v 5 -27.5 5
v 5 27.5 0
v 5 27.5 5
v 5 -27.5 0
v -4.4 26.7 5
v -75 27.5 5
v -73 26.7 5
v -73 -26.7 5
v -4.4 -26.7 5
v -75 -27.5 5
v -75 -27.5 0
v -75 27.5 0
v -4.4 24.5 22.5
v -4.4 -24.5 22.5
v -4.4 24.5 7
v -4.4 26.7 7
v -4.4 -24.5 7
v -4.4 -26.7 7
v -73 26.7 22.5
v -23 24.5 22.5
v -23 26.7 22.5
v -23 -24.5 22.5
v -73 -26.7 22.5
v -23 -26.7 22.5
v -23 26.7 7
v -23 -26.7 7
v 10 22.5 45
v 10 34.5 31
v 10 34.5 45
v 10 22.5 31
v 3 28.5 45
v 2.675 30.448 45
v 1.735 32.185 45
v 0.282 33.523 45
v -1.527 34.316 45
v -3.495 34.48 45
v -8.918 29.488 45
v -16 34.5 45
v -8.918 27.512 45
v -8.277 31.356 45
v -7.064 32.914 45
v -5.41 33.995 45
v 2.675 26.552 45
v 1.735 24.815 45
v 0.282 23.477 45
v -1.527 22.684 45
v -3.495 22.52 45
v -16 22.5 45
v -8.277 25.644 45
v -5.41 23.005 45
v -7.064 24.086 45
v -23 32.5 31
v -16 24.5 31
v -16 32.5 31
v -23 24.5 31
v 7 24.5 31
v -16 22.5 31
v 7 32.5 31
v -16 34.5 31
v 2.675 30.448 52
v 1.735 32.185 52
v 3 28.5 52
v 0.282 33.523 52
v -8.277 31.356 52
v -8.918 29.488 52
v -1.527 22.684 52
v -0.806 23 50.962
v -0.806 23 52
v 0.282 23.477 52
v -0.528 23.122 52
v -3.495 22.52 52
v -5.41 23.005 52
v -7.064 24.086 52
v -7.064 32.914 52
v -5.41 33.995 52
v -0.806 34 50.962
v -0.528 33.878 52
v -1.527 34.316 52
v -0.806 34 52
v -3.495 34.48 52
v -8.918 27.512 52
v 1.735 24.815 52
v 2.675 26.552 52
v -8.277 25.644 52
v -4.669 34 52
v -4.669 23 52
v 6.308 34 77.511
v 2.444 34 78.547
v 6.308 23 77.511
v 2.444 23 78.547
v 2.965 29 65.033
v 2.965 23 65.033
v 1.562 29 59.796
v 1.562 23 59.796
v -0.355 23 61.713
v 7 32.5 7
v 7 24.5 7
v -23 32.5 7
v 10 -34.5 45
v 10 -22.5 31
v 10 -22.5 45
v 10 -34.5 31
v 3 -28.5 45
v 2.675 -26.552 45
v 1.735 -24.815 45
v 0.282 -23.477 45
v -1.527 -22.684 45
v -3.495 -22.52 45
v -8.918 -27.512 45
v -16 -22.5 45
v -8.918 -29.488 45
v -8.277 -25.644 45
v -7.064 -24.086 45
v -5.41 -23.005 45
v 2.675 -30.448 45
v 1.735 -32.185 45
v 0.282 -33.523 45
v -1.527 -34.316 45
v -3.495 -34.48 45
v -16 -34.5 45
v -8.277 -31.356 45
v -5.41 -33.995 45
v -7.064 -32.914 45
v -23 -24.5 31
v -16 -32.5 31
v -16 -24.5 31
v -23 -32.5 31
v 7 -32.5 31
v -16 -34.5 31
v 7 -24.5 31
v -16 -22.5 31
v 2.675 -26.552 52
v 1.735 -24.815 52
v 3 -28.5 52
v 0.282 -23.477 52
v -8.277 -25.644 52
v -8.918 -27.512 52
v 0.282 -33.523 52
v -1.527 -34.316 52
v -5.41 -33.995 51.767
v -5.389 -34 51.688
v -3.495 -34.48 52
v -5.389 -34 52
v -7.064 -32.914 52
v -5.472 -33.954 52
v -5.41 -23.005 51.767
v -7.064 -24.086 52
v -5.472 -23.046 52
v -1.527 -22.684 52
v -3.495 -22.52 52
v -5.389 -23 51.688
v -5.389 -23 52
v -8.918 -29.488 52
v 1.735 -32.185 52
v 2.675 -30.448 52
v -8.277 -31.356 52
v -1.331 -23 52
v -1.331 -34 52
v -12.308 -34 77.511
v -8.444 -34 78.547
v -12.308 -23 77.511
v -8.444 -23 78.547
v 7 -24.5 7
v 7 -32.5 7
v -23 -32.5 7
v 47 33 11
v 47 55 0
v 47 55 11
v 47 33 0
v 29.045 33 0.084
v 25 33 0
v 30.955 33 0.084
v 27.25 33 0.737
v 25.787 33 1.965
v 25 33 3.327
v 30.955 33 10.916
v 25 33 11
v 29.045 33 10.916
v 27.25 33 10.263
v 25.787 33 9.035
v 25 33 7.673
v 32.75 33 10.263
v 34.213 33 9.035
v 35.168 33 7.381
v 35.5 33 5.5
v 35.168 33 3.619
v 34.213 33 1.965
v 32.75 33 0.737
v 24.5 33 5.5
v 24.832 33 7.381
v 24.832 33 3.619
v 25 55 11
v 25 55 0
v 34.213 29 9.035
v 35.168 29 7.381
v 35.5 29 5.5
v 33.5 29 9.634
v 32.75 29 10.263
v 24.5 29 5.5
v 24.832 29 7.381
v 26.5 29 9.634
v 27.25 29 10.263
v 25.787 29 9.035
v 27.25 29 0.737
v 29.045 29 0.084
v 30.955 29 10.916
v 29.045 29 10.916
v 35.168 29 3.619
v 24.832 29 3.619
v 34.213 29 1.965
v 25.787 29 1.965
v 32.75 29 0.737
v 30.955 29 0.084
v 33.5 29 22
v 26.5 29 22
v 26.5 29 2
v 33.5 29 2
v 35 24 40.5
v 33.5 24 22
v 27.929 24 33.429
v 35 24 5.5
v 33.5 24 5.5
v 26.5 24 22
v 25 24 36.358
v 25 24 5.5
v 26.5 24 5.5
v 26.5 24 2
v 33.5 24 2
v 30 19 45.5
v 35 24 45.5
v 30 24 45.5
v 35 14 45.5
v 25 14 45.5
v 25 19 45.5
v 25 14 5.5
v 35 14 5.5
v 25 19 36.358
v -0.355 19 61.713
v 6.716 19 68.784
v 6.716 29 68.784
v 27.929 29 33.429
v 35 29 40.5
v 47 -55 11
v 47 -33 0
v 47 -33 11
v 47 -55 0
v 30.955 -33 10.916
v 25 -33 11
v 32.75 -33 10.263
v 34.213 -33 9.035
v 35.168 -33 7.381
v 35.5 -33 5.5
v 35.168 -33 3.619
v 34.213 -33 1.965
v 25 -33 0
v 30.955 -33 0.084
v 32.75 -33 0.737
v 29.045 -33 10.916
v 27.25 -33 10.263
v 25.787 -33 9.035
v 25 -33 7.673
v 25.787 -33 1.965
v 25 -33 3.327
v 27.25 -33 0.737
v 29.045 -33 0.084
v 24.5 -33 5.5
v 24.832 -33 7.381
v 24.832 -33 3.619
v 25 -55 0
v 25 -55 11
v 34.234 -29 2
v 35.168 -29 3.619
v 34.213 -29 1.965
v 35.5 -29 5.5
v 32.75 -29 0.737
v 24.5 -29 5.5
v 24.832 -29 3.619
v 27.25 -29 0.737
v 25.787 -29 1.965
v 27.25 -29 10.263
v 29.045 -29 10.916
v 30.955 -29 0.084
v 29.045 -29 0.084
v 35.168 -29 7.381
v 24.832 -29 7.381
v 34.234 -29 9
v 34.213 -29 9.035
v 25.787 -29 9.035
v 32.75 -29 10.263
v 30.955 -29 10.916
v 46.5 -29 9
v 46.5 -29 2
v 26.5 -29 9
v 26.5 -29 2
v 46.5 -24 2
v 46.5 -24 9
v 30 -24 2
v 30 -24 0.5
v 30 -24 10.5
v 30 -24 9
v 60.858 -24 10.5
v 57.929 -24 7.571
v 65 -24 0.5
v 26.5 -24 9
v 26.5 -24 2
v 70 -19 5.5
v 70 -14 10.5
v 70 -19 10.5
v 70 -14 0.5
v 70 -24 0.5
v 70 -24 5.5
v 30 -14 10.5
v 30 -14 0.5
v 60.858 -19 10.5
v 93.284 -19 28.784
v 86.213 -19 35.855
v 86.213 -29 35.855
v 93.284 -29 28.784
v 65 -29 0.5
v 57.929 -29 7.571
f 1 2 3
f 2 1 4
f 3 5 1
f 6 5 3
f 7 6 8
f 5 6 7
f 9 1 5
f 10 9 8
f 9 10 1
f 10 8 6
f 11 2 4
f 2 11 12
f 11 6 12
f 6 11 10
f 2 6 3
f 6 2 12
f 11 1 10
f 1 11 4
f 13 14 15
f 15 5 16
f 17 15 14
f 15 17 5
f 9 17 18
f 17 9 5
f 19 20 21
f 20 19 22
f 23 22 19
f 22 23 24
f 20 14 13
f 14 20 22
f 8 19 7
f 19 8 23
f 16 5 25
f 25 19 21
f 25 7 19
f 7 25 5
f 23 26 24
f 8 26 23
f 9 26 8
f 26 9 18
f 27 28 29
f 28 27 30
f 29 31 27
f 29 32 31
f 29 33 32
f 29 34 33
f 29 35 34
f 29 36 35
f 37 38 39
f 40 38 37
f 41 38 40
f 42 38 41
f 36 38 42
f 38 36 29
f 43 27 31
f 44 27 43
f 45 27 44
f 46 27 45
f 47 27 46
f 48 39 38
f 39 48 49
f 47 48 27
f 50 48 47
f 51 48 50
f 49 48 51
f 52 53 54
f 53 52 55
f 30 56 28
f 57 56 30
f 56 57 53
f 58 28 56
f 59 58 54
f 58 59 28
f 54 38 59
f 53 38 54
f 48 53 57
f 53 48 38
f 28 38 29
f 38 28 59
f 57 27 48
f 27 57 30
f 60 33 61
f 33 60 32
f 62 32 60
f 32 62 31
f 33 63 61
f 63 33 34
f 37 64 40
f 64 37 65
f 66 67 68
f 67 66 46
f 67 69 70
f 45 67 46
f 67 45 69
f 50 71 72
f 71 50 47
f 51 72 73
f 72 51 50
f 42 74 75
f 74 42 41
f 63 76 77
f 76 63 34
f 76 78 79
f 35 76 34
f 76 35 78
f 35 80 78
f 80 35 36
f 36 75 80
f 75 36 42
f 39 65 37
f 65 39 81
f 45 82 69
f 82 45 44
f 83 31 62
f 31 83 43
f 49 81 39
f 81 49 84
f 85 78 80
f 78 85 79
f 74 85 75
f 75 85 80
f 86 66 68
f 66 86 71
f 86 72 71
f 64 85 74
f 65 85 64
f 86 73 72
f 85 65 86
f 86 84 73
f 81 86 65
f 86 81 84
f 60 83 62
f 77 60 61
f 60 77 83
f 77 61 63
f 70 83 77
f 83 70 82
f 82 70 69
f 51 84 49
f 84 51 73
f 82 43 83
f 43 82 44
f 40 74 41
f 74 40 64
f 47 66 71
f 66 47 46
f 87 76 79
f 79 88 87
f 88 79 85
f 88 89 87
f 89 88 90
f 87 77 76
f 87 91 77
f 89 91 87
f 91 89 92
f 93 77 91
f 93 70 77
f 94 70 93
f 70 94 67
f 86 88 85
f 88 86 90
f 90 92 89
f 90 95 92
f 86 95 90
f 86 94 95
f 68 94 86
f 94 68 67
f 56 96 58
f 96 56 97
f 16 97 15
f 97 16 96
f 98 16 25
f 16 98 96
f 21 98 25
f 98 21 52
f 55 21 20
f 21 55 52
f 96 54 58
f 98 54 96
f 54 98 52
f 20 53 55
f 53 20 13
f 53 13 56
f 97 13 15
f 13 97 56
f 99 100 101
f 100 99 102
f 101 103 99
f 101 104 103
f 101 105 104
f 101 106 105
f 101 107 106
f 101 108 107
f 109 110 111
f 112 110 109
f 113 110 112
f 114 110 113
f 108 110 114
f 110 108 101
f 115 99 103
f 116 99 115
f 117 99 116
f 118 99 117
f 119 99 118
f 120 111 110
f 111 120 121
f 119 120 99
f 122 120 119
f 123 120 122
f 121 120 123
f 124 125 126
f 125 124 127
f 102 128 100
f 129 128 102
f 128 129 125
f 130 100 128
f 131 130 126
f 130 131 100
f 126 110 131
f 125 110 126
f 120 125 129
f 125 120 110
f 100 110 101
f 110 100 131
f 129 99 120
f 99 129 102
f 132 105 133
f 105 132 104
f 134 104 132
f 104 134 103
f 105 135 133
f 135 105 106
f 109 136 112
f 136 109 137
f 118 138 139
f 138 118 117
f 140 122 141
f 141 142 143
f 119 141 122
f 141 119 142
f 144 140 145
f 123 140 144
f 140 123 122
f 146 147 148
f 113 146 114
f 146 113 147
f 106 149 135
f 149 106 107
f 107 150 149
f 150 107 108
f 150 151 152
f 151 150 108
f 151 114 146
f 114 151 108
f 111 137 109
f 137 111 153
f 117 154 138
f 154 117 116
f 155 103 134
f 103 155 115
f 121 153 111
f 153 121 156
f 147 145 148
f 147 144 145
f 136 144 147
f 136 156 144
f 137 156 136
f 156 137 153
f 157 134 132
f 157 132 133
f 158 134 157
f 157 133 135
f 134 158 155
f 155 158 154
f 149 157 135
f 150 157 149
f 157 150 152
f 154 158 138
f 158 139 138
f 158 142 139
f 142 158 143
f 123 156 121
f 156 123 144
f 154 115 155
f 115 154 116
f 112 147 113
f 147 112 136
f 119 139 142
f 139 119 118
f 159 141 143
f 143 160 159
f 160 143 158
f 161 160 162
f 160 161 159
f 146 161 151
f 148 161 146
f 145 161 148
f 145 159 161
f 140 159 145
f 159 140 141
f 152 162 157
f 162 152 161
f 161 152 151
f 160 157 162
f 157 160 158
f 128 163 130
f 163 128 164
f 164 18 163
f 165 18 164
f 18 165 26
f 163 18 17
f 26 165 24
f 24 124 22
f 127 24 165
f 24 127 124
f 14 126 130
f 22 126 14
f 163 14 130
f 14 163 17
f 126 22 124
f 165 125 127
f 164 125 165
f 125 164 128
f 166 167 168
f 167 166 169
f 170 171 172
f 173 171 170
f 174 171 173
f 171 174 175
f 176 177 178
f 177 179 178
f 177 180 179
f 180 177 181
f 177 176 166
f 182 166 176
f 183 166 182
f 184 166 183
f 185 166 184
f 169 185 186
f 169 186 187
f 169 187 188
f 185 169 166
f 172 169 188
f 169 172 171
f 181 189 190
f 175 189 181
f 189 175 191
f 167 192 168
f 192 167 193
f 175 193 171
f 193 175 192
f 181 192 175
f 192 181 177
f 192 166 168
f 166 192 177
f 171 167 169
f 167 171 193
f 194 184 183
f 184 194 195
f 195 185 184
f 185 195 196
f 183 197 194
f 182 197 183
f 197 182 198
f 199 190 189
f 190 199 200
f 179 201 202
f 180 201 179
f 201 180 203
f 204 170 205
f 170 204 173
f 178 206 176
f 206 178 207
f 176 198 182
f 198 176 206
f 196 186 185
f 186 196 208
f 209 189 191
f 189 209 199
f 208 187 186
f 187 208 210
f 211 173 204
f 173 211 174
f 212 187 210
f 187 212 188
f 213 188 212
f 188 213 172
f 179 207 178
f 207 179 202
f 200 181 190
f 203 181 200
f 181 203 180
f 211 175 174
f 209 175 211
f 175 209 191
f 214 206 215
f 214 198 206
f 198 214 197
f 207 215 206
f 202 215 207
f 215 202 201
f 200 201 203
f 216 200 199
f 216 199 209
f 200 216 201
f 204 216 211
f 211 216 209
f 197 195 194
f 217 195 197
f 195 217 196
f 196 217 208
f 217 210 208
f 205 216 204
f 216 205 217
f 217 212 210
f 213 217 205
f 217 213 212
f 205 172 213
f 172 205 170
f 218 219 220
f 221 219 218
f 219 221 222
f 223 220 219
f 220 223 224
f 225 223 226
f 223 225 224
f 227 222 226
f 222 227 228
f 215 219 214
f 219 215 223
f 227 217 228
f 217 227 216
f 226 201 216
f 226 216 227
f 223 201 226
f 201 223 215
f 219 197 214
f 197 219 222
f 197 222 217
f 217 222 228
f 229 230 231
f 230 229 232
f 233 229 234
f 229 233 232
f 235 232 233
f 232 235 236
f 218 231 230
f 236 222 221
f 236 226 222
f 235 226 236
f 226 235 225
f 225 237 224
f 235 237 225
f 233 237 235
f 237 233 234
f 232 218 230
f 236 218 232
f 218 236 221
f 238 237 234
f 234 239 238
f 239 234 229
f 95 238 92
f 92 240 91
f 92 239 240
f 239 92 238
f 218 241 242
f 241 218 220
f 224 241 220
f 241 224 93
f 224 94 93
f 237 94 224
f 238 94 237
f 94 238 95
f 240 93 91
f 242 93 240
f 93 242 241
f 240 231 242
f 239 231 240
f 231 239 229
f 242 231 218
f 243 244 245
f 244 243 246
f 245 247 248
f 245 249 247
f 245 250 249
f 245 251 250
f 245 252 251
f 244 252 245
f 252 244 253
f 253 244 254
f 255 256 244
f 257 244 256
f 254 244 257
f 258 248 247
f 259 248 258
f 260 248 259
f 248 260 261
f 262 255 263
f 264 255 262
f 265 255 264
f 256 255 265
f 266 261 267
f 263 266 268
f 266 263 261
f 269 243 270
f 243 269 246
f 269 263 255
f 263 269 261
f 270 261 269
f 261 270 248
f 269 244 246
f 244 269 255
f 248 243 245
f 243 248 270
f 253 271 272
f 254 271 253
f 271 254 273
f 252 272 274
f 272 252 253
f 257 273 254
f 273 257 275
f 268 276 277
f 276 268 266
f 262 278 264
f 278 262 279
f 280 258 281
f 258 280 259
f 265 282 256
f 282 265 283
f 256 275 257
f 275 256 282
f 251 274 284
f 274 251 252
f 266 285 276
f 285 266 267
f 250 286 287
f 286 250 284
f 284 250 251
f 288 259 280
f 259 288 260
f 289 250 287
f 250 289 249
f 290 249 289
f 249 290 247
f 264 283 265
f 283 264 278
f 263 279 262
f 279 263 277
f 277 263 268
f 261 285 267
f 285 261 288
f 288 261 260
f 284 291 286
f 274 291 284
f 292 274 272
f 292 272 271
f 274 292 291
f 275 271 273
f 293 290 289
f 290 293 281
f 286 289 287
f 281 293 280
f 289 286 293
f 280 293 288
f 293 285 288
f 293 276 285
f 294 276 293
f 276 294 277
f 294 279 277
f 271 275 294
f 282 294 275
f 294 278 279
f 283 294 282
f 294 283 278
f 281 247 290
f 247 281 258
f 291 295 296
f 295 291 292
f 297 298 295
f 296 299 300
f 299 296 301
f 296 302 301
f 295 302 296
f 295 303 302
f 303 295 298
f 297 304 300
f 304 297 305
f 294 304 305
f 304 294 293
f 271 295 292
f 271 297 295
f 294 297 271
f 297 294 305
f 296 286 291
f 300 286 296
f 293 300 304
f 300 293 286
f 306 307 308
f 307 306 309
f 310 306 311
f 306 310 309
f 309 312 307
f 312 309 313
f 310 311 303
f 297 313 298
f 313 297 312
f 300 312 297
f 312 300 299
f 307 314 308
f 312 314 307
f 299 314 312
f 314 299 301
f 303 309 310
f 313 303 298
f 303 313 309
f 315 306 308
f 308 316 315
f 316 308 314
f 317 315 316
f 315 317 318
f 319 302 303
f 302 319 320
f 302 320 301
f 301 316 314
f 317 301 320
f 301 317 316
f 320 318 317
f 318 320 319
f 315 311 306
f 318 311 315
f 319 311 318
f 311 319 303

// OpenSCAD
eps = 0.005; // Allow for overlaps/gaps

// Box dimensions
box_inner_x = 150;
box_inner_y = 110;
box_inner_z = 45;
box_outer_x = 175;
box_outer_y = 129;
box_outer_z = 50;

// Lid dimensions
lid_inner_x = 175;
lid_inner_y = 131;
lid_inner_z = 10;
lid_outer_x = 182;
lid_outer_y = 138;
lid_outer_z = 16;

// Lid hole positions
hole_diameter = 12;
hole_gap = 57;
hole_offset = -3;

// Servo positions
servo_offset = 30;
servo_height = 0;
servo_1_angle = 90;
servo_2_angle = 0;

// Box centered on the origin, with z0 at the bottom of the interior
box(
    inner_x = box_inner_x, inner_y = box_inner_y, inner_z = box_inner_z,
    outer_x = box_outer_x, outer_y = box_outer_y, outer_z = box_outer_z
);
// lid(
//     box_height = box_inner_z,
//     inner_x = lid_inner_x, inner_y = lid_inner_y, inner_z = lid_inner_z,
//     outer_x = lid_outer_x, outer_y = lid_outer_y, outer_z = lid_outer_z
// );
lid_with_holes(
    box_height = box_inner_z,
    inner_x = lid_inner_x, inner_y = lid_inner_y, inner_z = lid_inner_z,
    outer_x = lid_outer_x, outer_y = lid_outer_y, outer_z = lid_outer_z,
    hole_diameter = hole_diameter, hole_gap = hole_gap, hole_offset = hole_offset
);

// Arduino positioned center end
// 80 = Arduino frame x
translate([-(box_inner_x - 80) / 2, 0, 0])
arduino();

// Two switches
translate([hole_offset, hole_gap / 2, box_inner_z])
switch(
    color = "red",
    state = true
);
translate([hole_offset, -hole_gap / 2, box_inner_z])
switch(
    color = "green"
);

// Servos
// 5.5 = servo width
translate([servo_offset, box_inner_y / 2, 5.5 + servo_height])
rotate([90, 0, 0])
union() {
    servo(
        angle = servo_1_angle
    );
    translate([0, 0, 31])
    servo_arm(
        angle = servo_1_angle
    );
}

translate([servo_offset, -box_inner_y / 2, 5.5 + servo_height])
rotate([-90, 0, 0])
union() {
    servo(
        angle = servo_2_angle
    );
    translate([0, 0, 31])
    servo_arm(
        angle = servo_2_angle,
        mirror = true
    );
}

module box(
    inner_x, inner_y, inner_z,
    outer_x, outer_y, outer_z,
) {
    %color("blue", 0.45)
    difference() {
        // Outer
        translate([-outer_x / 2, -outer_y / 2, (inner_z - outer_z) - eps])
        cube([outer_x, outer_y, outer_z]);
        // Inner
        translate([-inner_x / 2, -inner_y / 2, 0])
        cube([inner_x, inner_y, inner_z]);
    }
}

module lid(
    box_height,
    inner_x, inner_y, inner_z,
    outer_x, outer_y, outer_z,
) {
    color("white", 0.45)
    difference() {
        // Outer
        translate([-outer_x / 2, -outer_y / 2, (box_height - inner_z) + eps + eps])
        cube([outer_x, outer_y, outer_z]);
        // Inner
        translate([-inner_x / 2, -inner_y / 2, (box_height - inner_z) + eps])
        cube([inner_x, inner_y, inner_z]);
    }
}

module lid_with_holes(
    box_height,
    inner_x, inner_y, inner_z,
    outer_x, outer_y, outer_z,
    hole_diameter, hole_gap, hole_offset,
) {

    %color("white", 0.55)
    difference() {
        lid(
            box_height = box_height,

            inner_x = inner_x,
            inner_y = inner_y,
            inner_z = inner_z,

            outer_x = outer_x,
            outer_y = outer_y,
            outer_z = outer_z
        );

        // Left hole
        translate([hole_offset, hole_gap / 2, box_height - eps])
        cylinder(h=10, r=hole_diameter / 2);

        // Right hole
        translate([hole_offset, -hole_gap / 2, box_height - eps])
        cylinder(h=10, r=hole_diameter / 2);
    }
}

module arduino() {
    tray_x = 80;
    tray_y = 55;
    tray_z = 5;

    arduino_x = 68.6;
    arduino_y = 53.4;
    arduino_z = 20;

    union() {
        // Transparent base tray
        color("white", 0.55)
        translate([-tray_x / 2, -tray_y / 2, 0])
        cube([tray_x, tray_y, tray_z]);

        // Arduino board itself
        color("green")
        translate([-38, -arduino_y / 2, tray_z / 2])
        cube([arduino_x, arduino_y, arduino_z]);
    }
}

module switch(
    color = "yellow",
    state = false,
) {
    union() {
        // Base
        color(color, 0.45)
        translate([-13, -6, -14])
        cube([26, 12, 14]);

        // Neck
        color("black")
        cylinder(h = 7, r = 6);

        // Toggle
        color(color, 0.45)
        translate([0, 0, 5.5])
        rotate([0, 15 * (state ? 1 : -1), 0])
        translate([0, 0, -5.5])
        translate([-2, -5.5, 6])
        cube([4, 11, 28]);

        // Connectors
        color("blue")
        translate([-20, -4, -38])
        cube([30, 8, 24]);
    }
}

module servo(
    angle = 0
) {
    union() {
        // Body
        color("blue")
        translate([-5, -5.5, 0])
        cube([22, 11, 22]);

        color("blue")
        translate([0, 0, 22])
        cylinder(r = 5.5, h = 4);

        // Arm
        color("white")
        rotate([0, 0, angle])
        translate([-3.5, -3.5, 26])
        cube([20, 7, 5]);
    }
}

module servo_arm(
    angle = 0,
    mirror = false,
) {
    rotate([0, 0, angle])
    mirror([0, (mirror ? 1 : 0), 0])
    union(){
        color("yellow")
        translate([0, -5, 0])
        cube([40, 10, 10]);

        color("yellow")
        translate([35, -5, -5])
        rotate([0, 0, 45])
        cube([40, 10, 10]);
    }
}
